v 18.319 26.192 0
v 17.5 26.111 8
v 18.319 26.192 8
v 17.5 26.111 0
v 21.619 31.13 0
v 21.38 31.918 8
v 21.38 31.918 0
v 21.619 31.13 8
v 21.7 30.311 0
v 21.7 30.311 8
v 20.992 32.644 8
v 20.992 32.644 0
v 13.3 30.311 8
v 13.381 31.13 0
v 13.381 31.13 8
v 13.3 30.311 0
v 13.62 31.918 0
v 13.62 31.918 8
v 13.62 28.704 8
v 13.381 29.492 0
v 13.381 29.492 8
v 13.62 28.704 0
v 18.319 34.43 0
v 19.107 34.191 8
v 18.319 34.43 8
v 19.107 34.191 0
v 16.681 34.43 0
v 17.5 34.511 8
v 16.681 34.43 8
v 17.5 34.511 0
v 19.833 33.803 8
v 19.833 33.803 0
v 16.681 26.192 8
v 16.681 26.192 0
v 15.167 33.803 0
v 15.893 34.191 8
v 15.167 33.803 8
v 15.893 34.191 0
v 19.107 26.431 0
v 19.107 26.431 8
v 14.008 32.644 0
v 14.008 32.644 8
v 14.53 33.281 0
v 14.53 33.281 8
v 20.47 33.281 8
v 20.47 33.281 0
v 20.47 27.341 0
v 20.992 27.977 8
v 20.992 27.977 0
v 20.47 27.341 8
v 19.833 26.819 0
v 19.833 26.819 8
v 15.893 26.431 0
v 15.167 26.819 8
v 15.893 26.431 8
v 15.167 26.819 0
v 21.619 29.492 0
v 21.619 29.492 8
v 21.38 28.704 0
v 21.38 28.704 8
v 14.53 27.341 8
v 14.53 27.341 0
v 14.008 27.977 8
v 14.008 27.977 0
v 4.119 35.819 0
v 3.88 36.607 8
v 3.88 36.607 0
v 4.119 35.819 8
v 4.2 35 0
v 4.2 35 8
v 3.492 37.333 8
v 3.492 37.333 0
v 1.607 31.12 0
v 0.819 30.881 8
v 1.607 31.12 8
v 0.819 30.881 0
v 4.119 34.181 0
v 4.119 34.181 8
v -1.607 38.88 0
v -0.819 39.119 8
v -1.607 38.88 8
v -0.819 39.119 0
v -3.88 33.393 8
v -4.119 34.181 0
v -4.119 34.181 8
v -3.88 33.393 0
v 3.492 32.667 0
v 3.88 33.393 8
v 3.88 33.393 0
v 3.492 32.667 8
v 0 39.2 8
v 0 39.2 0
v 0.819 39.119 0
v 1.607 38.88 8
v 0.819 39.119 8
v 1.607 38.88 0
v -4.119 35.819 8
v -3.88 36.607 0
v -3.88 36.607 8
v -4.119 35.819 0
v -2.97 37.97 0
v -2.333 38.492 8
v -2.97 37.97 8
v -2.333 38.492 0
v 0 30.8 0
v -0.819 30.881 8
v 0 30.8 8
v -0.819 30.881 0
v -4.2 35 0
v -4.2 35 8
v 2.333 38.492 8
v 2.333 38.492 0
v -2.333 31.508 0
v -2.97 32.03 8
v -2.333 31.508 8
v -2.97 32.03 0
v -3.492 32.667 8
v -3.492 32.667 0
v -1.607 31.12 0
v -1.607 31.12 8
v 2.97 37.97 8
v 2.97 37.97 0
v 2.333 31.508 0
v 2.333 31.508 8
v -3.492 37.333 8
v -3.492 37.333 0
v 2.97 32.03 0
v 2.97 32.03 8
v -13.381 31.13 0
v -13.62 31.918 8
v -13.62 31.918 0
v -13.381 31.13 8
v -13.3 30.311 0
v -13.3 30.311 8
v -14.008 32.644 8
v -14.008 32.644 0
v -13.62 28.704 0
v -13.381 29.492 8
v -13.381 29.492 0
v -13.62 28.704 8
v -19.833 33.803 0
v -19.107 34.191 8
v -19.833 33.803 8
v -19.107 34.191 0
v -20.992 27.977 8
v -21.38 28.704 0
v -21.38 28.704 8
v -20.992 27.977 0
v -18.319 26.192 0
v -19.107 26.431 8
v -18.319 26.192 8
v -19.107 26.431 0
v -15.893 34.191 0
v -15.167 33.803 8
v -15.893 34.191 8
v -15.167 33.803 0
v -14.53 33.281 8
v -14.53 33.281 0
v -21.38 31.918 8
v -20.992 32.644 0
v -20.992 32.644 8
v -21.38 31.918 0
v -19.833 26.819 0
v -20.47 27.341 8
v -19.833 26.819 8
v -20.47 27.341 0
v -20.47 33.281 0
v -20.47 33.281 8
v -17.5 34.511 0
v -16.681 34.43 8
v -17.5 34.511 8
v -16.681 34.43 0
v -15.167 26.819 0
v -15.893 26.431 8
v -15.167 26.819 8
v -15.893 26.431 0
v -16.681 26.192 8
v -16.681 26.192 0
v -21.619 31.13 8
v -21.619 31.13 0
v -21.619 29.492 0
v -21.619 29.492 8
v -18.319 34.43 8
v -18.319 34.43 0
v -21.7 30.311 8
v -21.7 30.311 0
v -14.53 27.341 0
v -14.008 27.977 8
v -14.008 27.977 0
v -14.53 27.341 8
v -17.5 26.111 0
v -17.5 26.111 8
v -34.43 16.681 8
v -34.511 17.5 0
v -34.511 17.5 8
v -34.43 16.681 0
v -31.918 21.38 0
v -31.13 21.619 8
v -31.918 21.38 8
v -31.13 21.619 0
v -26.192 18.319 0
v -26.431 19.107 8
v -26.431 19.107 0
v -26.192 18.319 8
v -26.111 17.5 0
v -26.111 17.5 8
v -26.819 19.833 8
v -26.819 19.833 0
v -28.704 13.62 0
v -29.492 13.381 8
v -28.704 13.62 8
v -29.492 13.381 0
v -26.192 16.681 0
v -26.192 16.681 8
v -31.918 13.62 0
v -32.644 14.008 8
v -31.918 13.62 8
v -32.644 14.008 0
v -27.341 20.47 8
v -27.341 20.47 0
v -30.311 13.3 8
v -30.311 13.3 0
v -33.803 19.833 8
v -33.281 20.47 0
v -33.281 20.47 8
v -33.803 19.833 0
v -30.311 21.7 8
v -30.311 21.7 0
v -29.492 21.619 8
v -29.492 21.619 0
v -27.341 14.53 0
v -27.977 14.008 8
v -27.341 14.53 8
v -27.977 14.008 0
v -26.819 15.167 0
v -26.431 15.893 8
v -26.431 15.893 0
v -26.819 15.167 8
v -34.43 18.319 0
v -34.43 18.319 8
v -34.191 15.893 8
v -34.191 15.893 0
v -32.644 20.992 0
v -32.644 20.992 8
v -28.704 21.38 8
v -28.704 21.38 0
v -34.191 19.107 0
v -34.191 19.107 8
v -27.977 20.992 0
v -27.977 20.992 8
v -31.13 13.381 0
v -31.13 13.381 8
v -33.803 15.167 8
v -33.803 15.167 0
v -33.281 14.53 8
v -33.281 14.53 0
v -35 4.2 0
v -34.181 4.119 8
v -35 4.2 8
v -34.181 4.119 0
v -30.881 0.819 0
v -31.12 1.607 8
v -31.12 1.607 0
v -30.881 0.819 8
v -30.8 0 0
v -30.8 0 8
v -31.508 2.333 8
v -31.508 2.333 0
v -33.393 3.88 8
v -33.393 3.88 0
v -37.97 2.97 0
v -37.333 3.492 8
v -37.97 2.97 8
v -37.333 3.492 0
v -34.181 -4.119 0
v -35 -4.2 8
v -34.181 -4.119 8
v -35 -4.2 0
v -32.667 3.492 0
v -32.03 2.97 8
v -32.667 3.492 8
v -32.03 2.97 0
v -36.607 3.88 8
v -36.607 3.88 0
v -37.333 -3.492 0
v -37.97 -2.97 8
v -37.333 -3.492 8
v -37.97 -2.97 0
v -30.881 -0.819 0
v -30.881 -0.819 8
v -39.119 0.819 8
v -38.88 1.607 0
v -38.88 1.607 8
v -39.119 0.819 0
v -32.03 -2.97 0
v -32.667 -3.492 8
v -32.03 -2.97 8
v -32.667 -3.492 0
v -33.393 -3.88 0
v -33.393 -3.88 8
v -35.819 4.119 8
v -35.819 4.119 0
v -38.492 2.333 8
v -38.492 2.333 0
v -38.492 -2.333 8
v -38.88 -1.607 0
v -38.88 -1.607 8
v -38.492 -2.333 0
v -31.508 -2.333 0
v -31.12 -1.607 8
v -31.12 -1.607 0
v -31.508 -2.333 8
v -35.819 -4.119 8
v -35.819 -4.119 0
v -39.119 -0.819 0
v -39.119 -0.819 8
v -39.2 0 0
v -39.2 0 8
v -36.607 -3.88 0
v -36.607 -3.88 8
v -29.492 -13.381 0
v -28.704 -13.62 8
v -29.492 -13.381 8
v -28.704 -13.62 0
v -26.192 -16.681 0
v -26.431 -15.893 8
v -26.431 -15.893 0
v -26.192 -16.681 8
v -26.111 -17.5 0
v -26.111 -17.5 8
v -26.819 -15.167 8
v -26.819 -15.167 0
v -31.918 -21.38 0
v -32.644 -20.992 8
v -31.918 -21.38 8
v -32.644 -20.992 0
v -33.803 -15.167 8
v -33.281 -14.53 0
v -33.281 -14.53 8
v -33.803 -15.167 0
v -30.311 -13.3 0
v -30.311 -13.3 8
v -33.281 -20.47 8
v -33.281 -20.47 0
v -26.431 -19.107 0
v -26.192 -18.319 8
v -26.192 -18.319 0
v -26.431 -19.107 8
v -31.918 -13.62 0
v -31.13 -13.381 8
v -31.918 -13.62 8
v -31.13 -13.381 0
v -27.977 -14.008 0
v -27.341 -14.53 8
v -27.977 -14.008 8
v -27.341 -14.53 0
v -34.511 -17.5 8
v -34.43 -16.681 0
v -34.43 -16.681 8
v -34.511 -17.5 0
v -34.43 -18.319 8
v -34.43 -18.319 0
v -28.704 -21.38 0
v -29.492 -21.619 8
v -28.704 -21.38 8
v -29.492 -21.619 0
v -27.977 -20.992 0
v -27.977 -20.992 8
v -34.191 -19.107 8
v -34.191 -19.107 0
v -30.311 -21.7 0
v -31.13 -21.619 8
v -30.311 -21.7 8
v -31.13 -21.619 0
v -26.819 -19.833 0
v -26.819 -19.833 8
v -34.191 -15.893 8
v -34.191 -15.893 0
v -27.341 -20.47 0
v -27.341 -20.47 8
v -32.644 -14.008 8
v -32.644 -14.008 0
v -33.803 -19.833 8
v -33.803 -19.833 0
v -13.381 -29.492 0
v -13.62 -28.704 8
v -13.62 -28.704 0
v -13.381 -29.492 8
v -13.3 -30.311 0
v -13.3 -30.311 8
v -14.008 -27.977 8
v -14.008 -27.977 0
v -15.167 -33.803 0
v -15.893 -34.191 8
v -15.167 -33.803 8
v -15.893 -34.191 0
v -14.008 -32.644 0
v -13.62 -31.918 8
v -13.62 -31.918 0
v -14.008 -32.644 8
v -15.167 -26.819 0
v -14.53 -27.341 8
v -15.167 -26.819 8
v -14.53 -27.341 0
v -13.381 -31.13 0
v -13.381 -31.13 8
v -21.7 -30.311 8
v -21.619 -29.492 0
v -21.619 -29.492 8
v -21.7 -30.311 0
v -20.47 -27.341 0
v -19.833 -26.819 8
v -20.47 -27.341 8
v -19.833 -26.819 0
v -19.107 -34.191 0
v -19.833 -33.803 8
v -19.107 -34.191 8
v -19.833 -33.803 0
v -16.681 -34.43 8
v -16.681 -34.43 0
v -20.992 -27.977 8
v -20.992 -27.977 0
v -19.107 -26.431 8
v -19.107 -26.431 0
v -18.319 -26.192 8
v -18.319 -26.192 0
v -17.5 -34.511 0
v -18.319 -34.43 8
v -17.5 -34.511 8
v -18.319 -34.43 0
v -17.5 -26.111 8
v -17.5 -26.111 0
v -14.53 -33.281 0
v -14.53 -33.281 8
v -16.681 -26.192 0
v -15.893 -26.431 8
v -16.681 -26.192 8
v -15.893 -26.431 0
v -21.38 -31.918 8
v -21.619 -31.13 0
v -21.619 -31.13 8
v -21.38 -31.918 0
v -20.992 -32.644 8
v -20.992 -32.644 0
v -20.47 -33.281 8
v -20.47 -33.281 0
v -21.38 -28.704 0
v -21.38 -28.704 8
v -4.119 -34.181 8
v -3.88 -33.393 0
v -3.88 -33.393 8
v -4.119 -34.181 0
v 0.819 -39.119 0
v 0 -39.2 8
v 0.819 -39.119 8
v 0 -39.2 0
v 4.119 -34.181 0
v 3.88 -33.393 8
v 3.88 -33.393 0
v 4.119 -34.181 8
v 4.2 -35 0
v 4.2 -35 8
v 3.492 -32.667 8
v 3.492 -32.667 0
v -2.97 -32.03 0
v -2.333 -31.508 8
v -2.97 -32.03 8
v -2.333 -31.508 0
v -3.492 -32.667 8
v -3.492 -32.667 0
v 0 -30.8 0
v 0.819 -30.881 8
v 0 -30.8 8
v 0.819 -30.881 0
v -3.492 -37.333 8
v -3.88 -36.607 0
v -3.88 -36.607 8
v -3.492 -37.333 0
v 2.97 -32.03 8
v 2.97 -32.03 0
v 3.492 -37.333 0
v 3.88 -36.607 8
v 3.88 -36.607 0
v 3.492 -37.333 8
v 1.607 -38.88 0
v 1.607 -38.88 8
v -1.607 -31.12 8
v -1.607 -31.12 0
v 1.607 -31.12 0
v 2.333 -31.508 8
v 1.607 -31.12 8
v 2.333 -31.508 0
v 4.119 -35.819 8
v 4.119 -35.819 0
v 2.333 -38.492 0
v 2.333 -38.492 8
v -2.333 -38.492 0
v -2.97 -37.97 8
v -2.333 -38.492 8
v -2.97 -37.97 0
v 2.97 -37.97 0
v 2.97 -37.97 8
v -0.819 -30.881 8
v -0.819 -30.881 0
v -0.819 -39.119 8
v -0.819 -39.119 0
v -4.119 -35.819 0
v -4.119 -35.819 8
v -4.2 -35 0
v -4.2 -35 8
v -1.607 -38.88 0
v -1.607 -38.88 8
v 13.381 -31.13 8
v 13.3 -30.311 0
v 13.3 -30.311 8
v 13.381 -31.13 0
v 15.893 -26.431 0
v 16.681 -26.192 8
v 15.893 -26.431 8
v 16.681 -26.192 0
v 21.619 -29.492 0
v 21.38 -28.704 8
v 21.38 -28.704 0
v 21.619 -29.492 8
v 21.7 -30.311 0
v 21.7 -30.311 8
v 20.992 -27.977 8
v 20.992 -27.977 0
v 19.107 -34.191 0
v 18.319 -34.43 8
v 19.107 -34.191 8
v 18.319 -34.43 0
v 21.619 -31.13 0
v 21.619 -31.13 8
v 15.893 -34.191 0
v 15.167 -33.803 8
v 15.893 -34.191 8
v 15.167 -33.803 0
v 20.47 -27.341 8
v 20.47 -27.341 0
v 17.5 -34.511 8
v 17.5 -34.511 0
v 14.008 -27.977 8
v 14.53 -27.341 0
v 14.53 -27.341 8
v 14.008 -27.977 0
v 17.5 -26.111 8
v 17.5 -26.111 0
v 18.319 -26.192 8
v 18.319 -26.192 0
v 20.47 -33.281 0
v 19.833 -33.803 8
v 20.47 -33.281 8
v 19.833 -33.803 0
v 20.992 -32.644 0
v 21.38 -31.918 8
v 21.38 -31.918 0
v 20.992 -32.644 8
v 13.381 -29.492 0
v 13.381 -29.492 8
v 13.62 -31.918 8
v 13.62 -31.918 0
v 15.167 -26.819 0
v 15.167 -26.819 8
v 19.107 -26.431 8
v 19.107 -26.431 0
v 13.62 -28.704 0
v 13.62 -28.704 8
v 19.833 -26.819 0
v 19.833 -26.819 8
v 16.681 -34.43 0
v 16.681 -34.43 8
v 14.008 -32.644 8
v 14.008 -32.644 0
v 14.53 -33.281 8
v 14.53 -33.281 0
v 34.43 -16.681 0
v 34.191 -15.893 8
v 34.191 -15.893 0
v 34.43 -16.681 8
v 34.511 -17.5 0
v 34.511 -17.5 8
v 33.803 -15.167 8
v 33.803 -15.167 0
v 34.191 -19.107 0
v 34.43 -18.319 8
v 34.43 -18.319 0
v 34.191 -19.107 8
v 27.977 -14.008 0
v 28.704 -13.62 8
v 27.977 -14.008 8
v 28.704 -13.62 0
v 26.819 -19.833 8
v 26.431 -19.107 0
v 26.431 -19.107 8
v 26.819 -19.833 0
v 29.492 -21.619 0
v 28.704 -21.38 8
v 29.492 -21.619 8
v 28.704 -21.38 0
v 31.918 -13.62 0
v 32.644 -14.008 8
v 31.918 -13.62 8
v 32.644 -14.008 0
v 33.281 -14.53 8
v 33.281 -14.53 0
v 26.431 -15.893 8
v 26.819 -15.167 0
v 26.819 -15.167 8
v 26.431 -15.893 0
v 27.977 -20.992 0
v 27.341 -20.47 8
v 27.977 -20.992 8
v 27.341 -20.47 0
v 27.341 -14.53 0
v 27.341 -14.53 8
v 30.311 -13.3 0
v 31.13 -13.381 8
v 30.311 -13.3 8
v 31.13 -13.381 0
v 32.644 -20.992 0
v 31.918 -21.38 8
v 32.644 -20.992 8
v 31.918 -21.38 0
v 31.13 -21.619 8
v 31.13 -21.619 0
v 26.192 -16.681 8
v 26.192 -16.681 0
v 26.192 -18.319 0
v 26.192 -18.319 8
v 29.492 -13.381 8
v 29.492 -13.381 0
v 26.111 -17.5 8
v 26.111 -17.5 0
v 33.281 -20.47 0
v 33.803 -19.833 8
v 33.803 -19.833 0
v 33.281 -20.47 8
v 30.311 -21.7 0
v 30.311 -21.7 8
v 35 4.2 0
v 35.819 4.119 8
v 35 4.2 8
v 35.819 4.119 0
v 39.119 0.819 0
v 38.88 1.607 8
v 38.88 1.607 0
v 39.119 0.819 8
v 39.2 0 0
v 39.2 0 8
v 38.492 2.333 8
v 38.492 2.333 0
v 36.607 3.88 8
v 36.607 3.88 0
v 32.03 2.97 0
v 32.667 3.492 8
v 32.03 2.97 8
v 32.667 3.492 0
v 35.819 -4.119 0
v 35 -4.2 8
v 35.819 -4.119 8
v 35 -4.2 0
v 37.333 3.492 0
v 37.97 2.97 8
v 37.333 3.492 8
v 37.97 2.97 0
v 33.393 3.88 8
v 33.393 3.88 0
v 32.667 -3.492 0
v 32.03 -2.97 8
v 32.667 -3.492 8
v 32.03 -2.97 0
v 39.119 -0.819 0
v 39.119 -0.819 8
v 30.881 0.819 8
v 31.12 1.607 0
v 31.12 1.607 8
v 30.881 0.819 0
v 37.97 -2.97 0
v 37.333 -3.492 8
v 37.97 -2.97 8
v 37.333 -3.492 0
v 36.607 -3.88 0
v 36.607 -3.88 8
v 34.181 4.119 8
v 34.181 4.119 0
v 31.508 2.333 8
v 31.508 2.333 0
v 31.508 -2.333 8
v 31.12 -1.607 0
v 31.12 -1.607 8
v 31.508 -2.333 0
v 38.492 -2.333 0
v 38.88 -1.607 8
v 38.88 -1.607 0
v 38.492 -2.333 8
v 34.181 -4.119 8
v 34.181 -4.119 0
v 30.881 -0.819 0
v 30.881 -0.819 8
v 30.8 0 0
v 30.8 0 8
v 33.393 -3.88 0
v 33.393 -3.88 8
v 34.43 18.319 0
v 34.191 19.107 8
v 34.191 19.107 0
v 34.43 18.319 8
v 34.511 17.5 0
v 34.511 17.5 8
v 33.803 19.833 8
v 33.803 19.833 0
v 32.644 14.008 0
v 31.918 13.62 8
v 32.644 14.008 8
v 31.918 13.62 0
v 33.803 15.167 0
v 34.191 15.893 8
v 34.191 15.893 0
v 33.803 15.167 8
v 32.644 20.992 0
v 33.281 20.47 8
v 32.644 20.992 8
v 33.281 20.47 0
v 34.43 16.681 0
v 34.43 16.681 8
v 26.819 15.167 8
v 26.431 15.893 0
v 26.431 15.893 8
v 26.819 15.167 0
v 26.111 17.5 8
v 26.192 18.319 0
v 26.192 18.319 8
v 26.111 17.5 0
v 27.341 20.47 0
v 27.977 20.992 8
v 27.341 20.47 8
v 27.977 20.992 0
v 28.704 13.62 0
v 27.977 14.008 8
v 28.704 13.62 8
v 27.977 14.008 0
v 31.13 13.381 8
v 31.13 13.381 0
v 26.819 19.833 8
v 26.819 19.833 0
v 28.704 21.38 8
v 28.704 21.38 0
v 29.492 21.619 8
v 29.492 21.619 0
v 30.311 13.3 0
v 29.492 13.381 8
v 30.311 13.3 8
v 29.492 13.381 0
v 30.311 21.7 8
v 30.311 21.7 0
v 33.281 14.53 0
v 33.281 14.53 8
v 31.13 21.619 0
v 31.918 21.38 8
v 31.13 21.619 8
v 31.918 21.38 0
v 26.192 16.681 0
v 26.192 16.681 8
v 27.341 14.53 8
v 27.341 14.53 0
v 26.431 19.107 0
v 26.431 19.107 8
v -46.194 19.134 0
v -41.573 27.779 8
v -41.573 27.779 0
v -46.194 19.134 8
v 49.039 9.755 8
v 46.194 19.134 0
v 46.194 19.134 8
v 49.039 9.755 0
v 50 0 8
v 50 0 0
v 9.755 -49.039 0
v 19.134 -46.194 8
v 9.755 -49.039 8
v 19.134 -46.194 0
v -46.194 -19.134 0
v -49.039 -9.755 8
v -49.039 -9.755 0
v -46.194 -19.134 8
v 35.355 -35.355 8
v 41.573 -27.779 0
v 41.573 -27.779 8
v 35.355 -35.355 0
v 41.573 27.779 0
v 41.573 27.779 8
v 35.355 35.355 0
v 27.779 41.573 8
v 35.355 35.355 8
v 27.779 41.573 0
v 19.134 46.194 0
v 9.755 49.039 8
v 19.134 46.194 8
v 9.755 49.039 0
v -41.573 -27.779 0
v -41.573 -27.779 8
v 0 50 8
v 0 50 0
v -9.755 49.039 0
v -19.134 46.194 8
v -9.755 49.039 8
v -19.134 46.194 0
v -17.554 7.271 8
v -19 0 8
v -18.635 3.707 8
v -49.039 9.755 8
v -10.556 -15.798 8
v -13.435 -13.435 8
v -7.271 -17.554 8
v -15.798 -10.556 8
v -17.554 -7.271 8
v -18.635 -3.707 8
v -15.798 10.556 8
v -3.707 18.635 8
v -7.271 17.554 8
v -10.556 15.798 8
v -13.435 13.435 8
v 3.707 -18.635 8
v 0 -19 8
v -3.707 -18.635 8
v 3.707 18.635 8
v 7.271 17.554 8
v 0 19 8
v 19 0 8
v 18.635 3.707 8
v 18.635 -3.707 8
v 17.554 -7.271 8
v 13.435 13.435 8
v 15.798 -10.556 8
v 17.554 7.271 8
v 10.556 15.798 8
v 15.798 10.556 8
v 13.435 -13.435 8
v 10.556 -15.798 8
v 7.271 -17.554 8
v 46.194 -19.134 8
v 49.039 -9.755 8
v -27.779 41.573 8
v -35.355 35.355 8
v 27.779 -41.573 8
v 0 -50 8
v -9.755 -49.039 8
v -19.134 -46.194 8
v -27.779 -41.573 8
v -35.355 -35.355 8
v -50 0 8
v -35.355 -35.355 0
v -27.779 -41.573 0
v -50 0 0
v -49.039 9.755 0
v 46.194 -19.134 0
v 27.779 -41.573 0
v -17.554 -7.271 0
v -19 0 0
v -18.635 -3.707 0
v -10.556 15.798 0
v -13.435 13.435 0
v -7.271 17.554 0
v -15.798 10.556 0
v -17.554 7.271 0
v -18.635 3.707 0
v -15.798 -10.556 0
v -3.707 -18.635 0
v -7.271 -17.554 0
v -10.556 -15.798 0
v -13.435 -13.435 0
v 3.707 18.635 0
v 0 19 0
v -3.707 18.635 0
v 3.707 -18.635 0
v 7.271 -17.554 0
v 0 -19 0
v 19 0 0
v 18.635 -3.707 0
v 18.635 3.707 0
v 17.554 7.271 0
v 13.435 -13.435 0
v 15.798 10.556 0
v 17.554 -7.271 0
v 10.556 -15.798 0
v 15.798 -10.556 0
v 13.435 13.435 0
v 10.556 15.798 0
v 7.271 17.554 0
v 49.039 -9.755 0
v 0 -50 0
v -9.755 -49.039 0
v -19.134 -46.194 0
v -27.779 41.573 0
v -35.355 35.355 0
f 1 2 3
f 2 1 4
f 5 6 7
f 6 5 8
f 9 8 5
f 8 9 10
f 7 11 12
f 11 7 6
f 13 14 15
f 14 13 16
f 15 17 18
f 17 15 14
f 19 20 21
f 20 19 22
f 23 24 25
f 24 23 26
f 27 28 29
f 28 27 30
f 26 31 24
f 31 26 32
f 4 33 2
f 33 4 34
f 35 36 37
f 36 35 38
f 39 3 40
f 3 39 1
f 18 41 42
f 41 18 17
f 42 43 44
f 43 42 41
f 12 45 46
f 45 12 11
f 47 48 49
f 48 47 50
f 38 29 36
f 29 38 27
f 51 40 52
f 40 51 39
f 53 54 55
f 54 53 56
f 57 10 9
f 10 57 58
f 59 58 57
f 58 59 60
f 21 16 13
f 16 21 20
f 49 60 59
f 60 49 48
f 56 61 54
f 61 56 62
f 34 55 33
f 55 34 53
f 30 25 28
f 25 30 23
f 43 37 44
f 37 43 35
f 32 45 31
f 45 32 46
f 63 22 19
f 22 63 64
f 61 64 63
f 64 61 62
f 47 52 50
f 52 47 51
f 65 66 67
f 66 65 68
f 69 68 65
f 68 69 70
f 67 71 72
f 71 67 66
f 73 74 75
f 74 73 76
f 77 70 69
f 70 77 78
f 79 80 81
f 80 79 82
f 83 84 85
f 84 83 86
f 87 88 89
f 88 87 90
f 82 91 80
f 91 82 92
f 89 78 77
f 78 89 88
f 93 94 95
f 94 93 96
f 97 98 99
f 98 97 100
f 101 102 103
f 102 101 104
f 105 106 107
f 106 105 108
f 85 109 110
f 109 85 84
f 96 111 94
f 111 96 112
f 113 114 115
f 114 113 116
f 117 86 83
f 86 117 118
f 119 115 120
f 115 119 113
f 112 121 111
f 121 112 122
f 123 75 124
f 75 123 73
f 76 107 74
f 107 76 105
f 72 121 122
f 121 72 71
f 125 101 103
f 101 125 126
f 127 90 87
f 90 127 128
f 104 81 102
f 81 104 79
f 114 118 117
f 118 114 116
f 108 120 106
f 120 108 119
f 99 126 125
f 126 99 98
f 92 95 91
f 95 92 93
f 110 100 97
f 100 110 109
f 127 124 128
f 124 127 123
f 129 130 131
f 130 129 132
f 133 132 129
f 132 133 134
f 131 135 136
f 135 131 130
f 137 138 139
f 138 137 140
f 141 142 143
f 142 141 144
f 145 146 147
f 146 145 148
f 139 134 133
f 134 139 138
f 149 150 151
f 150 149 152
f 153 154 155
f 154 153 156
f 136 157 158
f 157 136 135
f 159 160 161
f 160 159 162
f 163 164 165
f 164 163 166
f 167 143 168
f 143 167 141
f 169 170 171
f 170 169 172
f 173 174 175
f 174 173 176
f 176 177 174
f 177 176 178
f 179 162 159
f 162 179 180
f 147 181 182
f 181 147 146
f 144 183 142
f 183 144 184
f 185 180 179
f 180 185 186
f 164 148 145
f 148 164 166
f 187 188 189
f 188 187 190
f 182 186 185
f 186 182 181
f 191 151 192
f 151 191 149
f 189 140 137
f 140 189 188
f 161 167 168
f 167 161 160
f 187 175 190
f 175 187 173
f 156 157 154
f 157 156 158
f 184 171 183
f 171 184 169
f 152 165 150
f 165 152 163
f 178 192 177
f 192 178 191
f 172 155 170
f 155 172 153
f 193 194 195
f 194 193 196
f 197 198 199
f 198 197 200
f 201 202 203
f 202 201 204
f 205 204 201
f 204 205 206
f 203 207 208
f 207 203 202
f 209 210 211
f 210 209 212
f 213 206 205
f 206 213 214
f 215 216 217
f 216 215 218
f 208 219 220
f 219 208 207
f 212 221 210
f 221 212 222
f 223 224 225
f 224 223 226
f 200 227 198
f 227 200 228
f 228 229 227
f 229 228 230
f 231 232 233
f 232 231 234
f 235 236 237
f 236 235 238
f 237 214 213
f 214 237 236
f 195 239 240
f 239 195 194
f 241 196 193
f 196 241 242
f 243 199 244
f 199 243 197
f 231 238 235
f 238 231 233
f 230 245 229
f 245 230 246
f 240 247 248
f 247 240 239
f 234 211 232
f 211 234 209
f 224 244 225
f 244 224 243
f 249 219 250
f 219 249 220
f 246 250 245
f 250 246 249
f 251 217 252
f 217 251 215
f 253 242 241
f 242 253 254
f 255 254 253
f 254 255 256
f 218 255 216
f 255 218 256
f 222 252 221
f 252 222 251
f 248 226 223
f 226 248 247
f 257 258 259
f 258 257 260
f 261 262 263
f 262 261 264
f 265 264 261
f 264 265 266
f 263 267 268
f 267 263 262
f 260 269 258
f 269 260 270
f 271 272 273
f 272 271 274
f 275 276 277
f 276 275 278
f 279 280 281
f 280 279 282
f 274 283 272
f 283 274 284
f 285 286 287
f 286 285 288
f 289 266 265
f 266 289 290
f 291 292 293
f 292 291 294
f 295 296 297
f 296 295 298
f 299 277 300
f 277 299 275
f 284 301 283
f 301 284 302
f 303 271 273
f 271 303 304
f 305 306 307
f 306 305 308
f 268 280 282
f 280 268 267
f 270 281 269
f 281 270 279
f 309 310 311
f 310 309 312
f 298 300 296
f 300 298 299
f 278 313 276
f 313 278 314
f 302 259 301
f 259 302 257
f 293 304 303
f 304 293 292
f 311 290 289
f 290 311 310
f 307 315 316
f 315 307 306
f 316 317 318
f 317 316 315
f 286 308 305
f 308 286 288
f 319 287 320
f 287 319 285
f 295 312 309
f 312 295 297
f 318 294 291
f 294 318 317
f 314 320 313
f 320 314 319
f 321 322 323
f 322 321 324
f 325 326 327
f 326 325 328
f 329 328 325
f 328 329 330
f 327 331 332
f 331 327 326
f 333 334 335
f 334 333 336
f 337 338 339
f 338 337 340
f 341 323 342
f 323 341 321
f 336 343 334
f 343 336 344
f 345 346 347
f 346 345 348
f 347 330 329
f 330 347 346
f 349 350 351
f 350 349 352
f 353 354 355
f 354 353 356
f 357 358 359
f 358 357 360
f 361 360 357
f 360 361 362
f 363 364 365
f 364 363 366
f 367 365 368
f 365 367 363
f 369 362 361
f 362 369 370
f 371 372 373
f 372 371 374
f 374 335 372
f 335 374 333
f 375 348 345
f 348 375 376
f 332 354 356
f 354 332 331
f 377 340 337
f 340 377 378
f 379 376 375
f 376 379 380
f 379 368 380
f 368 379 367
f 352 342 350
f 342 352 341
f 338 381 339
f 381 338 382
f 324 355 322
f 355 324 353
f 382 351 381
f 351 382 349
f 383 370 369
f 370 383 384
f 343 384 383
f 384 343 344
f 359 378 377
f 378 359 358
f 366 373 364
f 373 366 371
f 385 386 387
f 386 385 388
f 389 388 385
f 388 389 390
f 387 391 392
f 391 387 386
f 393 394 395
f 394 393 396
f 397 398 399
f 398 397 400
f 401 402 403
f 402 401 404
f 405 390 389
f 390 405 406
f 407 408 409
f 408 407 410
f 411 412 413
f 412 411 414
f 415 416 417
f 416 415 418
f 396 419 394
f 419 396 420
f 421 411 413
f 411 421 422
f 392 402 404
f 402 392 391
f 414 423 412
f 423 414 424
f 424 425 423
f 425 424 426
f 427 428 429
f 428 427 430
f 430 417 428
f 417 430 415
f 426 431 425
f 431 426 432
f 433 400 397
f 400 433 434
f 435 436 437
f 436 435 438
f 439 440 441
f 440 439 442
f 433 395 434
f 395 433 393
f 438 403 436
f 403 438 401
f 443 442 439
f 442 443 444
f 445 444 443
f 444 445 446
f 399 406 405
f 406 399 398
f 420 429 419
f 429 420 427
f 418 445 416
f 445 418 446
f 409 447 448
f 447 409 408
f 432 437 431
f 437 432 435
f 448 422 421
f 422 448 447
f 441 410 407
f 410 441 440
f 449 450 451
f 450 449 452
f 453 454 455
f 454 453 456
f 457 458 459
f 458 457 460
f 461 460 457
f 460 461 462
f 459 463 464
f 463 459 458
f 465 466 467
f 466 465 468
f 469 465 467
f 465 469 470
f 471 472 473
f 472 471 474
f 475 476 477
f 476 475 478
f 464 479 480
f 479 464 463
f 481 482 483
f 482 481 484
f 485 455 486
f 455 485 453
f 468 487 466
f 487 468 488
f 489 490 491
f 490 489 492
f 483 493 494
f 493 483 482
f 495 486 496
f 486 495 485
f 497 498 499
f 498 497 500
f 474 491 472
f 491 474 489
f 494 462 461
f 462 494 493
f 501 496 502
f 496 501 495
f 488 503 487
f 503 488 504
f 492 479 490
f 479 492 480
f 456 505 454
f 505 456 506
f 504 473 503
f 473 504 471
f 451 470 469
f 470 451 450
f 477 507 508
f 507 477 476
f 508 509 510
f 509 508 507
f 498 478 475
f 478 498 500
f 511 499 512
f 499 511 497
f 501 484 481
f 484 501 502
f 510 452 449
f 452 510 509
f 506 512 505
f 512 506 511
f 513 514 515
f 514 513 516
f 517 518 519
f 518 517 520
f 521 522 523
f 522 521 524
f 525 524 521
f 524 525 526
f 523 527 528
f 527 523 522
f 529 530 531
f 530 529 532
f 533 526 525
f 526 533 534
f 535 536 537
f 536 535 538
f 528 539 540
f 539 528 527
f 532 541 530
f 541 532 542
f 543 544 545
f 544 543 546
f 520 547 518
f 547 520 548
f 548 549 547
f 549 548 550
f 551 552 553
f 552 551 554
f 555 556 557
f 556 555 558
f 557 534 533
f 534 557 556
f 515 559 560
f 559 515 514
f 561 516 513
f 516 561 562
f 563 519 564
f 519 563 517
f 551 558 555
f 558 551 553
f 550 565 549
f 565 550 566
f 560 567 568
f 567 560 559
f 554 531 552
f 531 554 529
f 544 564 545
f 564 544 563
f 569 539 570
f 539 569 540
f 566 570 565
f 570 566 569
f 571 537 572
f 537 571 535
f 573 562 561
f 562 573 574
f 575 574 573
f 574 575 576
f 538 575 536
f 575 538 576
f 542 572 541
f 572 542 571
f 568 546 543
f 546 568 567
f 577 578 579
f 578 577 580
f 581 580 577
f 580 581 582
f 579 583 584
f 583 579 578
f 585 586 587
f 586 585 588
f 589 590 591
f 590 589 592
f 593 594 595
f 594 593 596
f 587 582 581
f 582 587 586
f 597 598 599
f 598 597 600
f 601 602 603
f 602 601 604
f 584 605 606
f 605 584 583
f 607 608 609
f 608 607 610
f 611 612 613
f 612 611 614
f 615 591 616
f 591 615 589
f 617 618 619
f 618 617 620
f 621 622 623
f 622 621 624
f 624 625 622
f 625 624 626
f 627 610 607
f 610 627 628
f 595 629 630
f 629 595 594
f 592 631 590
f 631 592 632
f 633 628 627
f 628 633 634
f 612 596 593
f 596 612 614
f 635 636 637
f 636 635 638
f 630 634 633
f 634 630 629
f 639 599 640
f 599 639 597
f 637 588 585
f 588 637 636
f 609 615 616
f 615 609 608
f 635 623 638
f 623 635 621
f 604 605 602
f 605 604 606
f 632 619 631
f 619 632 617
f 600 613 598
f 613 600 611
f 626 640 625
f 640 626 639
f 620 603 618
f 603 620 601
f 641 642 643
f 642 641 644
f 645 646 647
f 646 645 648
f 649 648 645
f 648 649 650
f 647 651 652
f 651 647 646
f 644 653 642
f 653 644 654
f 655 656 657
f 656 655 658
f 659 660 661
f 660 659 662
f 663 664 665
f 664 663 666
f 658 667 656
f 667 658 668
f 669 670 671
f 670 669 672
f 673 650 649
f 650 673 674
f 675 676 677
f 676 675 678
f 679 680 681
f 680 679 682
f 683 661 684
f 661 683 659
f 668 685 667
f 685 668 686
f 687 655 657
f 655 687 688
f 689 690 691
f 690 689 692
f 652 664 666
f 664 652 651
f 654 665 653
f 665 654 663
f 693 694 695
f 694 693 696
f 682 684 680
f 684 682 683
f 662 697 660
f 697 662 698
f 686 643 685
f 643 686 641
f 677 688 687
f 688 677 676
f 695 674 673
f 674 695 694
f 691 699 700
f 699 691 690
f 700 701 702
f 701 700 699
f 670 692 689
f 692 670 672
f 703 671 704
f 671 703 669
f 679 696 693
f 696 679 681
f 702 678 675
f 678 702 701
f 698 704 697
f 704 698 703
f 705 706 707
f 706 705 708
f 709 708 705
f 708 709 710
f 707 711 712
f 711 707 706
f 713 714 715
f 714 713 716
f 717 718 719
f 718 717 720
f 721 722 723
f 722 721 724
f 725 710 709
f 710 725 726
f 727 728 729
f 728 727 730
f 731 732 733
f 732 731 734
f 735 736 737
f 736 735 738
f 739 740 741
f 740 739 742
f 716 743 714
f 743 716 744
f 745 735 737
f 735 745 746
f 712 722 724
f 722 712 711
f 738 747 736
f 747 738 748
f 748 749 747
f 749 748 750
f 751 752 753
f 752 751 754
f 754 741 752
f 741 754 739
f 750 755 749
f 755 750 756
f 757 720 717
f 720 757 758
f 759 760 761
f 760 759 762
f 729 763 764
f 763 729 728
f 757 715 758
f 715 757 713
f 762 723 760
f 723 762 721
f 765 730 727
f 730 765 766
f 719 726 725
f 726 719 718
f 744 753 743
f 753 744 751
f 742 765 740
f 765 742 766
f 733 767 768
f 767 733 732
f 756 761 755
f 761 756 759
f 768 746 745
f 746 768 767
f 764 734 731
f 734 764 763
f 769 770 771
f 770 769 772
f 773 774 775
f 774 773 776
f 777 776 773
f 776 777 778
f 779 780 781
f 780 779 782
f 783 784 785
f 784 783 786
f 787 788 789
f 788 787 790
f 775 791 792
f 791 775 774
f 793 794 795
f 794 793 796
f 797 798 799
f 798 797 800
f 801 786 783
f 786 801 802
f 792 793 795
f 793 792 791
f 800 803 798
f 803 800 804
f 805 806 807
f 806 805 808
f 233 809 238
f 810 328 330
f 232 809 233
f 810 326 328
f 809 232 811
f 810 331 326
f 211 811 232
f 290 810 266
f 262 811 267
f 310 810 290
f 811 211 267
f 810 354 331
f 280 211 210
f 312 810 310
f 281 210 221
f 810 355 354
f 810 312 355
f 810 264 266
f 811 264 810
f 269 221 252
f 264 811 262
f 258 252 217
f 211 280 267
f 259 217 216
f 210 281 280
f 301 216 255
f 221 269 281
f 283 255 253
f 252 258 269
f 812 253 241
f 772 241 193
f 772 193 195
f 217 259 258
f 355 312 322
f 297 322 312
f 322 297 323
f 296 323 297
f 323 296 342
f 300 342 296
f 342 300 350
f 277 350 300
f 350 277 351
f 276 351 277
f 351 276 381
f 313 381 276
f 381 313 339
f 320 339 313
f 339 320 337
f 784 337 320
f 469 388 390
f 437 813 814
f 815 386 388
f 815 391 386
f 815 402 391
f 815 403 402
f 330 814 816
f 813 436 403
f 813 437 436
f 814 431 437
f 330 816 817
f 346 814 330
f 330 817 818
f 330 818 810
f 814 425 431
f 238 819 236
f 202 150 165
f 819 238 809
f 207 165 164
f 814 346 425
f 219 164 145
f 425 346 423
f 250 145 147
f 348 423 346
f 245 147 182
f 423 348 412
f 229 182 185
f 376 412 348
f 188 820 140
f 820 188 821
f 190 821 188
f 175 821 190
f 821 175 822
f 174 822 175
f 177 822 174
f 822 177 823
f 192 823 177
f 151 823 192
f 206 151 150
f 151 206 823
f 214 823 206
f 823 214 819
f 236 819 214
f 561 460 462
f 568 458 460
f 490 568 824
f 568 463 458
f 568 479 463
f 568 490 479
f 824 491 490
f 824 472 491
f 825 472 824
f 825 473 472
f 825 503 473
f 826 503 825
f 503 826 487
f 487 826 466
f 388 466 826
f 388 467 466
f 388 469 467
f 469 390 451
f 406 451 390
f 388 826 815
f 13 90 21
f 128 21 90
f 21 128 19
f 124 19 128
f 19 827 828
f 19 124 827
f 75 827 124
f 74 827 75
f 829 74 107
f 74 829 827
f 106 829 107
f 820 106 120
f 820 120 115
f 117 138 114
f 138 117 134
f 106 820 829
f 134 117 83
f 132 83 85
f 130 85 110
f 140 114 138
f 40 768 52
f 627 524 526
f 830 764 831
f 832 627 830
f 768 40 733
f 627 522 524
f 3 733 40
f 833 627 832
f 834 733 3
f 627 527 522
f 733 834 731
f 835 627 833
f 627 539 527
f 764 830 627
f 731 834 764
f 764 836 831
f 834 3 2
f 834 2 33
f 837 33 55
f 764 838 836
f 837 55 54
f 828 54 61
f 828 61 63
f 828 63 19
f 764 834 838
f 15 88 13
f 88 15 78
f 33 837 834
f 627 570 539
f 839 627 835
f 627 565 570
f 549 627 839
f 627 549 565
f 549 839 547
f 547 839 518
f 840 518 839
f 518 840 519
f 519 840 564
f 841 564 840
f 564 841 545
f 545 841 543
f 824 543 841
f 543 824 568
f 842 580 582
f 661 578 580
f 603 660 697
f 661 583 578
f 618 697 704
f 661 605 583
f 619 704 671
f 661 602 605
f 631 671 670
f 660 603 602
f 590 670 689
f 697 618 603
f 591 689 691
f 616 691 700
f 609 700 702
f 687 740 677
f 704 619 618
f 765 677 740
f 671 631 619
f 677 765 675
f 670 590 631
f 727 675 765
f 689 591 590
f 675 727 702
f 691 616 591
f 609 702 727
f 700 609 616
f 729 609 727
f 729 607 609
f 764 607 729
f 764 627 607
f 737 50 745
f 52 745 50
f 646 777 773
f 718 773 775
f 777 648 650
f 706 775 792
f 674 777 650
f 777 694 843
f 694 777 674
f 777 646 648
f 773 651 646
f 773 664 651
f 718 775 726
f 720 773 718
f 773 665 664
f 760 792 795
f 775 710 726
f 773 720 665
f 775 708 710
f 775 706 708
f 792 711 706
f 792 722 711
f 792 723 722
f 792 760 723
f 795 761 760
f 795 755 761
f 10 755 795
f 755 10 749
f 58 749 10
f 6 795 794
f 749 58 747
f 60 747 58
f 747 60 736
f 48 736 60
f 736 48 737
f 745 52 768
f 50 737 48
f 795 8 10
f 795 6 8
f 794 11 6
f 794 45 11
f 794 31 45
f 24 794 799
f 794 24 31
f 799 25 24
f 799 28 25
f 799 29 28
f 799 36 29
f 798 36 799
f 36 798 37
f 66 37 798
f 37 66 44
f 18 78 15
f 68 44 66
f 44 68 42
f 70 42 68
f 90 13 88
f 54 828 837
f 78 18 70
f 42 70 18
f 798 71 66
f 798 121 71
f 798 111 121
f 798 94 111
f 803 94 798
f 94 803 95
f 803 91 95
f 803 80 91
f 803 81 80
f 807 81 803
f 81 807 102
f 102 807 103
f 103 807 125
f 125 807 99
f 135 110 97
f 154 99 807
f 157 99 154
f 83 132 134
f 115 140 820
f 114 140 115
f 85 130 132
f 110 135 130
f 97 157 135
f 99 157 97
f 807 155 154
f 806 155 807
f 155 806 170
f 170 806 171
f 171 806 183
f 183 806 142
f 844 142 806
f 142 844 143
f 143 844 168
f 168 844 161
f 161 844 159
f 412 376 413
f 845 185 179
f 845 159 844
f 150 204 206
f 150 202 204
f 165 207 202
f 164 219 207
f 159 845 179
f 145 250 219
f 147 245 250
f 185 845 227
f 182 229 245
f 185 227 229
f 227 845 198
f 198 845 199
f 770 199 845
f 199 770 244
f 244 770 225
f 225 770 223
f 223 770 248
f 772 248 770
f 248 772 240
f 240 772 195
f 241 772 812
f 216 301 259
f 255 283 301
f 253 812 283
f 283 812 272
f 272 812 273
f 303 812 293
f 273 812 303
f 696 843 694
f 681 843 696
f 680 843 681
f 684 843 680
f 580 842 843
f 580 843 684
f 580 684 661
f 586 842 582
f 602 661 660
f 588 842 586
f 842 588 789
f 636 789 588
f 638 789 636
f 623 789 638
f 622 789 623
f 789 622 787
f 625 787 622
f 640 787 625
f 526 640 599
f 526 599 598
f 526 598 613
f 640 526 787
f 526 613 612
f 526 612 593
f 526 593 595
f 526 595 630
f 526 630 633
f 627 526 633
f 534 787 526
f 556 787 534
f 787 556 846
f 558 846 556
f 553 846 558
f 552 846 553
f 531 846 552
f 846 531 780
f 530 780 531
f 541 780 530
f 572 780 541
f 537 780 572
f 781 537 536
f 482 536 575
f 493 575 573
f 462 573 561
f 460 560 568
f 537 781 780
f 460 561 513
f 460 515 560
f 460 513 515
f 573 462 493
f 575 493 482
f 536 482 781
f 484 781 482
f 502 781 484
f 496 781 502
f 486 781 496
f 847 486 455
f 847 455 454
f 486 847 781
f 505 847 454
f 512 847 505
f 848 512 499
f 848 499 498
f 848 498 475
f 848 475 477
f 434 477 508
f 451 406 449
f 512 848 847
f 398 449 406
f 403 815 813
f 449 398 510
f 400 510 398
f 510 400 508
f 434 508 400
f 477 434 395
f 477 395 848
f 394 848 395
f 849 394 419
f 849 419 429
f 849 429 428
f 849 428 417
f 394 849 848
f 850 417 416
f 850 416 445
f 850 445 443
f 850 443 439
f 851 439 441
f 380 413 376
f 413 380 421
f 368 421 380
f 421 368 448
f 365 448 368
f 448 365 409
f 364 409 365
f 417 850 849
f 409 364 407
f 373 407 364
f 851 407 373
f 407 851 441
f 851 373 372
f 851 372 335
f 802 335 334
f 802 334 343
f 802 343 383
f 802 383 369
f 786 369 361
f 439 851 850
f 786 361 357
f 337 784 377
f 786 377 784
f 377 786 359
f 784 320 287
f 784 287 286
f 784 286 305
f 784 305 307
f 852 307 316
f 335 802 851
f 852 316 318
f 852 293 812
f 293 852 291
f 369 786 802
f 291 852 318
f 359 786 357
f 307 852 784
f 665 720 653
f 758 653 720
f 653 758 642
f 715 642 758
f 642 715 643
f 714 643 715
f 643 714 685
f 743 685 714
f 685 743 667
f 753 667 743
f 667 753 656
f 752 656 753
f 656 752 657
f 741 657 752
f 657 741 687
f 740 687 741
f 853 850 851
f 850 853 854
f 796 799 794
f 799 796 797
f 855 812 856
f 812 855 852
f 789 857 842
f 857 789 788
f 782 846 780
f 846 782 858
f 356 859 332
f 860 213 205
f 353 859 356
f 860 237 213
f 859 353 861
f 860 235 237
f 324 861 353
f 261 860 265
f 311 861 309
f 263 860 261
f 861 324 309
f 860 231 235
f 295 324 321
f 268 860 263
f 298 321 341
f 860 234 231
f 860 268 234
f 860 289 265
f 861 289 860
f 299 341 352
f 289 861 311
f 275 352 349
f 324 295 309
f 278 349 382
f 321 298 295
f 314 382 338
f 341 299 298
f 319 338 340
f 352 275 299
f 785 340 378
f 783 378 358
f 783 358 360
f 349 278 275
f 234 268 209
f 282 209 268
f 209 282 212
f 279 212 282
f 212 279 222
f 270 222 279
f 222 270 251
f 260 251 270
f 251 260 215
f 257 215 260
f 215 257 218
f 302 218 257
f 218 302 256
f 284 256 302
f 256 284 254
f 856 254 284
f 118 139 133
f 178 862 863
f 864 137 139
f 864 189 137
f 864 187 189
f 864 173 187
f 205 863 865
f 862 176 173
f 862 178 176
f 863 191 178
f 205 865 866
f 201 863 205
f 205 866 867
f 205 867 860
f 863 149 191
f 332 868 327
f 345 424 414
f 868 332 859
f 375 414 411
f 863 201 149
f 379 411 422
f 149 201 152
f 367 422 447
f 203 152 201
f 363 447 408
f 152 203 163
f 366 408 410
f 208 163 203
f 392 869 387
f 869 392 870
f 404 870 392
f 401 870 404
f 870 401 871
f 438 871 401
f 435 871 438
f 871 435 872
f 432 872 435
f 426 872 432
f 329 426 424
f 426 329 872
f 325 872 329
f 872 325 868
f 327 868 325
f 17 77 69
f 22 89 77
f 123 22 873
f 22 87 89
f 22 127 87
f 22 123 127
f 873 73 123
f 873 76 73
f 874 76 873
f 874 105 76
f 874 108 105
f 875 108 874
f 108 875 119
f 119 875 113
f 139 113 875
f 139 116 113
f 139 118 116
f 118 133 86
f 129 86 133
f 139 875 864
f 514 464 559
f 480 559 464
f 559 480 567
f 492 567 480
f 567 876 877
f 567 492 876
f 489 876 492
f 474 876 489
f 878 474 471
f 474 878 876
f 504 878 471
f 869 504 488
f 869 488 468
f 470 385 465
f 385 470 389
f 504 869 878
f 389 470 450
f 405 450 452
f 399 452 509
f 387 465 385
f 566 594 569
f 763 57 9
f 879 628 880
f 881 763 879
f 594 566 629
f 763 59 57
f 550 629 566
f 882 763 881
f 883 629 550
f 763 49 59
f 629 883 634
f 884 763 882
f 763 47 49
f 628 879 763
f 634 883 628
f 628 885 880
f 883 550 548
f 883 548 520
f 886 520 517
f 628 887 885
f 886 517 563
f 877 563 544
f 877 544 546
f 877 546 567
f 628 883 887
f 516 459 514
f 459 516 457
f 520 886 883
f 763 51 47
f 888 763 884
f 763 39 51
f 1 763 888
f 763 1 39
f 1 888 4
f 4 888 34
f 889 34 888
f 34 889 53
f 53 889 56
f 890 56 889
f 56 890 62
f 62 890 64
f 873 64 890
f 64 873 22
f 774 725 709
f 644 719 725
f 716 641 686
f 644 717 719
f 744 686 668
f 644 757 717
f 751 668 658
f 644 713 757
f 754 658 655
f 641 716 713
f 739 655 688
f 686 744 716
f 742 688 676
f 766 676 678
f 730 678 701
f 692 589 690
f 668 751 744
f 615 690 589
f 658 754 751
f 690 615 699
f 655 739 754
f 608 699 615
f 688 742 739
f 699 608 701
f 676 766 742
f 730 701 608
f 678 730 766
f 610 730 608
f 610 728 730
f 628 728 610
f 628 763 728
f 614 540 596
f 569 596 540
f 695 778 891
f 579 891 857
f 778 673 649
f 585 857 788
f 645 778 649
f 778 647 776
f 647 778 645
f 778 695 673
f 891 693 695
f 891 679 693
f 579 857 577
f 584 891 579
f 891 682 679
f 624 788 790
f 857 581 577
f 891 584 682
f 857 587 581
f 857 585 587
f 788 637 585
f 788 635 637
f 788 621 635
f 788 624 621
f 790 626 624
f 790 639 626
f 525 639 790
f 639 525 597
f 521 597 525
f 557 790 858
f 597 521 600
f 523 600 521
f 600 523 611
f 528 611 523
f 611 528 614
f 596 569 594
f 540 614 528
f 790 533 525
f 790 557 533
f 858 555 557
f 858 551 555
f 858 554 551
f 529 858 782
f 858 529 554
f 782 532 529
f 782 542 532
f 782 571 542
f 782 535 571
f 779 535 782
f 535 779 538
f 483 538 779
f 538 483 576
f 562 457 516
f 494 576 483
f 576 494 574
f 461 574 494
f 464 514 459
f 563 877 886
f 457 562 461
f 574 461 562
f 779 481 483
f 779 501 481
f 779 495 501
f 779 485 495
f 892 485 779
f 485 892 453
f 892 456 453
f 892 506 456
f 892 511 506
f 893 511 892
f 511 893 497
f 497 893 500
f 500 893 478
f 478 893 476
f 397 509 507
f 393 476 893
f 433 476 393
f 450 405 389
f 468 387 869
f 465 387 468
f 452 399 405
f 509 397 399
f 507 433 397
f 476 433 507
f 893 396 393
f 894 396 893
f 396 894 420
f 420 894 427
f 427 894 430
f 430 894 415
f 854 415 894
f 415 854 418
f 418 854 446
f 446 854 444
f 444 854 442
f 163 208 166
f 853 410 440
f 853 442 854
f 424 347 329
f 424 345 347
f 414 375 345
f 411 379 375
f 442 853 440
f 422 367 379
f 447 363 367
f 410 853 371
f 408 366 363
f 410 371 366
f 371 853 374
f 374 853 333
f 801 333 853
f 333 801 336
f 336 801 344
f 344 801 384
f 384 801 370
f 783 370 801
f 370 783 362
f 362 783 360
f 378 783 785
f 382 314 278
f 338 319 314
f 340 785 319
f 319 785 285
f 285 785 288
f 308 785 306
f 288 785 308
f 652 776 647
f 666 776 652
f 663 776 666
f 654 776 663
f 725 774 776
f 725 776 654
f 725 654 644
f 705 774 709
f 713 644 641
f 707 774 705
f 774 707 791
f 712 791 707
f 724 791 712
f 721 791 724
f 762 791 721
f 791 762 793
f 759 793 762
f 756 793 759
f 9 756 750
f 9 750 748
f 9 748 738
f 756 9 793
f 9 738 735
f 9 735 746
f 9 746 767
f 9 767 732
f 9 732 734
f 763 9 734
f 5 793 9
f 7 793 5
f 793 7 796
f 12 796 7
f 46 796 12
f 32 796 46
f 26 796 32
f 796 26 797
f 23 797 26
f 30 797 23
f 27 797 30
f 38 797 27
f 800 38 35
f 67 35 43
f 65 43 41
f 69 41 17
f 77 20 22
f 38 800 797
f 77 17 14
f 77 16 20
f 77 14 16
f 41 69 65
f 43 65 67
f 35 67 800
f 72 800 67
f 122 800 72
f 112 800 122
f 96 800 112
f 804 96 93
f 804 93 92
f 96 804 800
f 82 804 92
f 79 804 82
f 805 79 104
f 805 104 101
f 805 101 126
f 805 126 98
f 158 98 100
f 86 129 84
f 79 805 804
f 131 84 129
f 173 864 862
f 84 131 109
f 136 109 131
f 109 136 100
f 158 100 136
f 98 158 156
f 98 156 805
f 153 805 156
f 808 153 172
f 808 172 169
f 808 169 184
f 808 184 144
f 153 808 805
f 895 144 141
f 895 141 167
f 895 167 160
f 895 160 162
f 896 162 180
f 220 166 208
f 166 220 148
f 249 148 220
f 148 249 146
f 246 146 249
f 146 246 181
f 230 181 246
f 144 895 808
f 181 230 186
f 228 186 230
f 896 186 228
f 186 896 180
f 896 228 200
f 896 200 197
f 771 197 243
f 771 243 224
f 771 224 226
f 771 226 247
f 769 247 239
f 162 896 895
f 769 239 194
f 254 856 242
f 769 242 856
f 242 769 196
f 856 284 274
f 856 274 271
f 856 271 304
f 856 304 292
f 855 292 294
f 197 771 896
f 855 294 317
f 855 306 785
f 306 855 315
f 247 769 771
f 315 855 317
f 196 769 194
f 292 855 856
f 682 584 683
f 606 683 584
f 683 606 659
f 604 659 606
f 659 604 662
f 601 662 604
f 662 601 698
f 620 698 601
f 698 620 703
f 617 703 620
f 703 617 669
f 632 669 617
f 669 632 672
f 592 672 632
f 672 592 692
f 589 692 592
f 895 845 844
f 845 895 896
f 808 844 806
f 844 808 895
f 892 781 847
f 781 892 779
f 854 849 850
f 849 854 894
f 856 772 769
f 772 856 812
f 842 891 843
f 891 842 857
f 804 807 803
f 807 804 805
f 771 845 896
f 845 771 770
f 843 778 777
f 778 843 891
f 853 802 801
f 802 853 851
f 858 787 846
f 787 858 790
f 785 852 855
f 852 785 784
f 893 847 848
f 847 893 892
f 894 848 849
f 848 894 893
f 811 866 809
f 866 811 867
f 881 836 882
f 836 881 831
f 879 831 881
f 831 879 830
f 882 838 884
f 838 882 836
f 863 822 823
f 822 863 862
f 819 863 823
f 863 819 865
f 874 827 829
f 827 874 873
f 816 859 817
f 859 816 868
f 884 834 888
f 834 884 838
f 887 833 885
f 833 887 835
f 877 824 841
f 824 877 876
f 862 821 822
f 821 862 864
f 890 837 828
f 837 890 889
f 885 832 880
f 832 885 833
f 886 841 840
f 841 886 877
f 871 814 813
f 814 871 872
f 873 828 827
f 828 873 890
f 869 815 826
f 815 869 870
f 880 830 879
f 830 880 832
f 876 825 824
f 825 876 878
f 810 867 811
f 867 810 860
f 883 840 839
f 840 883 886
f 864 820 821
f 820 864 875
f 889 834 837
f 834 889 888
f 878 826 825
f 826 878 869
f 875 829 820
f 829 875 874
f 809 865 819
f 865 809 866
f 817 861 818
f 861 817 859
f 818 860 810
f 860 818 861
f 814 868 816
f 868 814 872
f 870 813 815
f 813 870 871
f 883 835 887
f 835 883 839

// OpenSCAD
$fn = 32;

// ----------------------------------------------------------------------
// Flange Ø100 x 8
// 12 holes on a Ø70 bolt circle, bolted joints
// ----------------------------------------------------------------------

// --- parameters (mm) ---
flange_d = 100;  // outside diameter of the flange
thickness = 8;   // flange thickness
holes = 12;      // number of bolt holes
pcd = 70;        // bolt circle diameter
start_deg = 60;  // angle of the first hole, from +X
hole_d = 8.4;    // bolt hole diameter
bore_d = 38;     // central through bore
hub_d = 46;      // hub outside diameter
hub_h = 0;       // hub height above the flange face (0 = no hub)

// --- derived feature positions (mm) ---
height = thickness + hub_h;  // = 8   overall height of the part
pcd_r = pcd / 2;             // = 35   bolt circle radius
hole_step = 360 / holes;     // = 30   angular pitch
feature_centers = [
  [pcd_r * cos(start_deg + 0 * hole_step), pcd_r * sin(start_deg + 0 * hole_step)],
  [pcd_r * cos(start_deg + 1 * hole_step), pcd_r * sin(start_deg + 1 * hole_step)],
  [pcd_r * cos(start_deg + 2 * hole_step), pcd_r * sin(start_deg + 2 * hole_step)],
  [pcd_r * cos(start_deg + 3 * hole_step), pcd_r * sin(start_deg + 3 * hole_step)],
  [pcd_r * cos(start_deg + 4 * hole_step), pcd_r * sin(start_deg + 4 * hole_step)],
  [pcd_r * cos(start_deg + 5 * hole_step), pcd_r * sin(start_deg + 5 * hole_step)],
  [pcd_r * cos(start_deg + 6 * hole_step), pcd_r * sin(start_deg + 6 * hole_step)],
  [pcd_r * cos(start_deg + 7 * hole_step), pcd_r * sin(start_deg + 7 * hole_step)],
  [pcd_r * cos(start_deg + 8 * hole_step), pcd_r * sin(start_deg + 8 * hole_step)],
  [pcd_r * cos(start_deg + 9 * hole_step), pcd_r * sin(start_deg + 9 * hole_step)],
  [pcd_r * cos(start_deg + 10 * hole_step), pcd_r * sin(start_deg + 10 * hole_step)],
  [pcd_r * cos(start_deg + 11 * hole_step), pcd_r * sin(start_deg + 11 * hole_step)]
];   // bolt hole centres on the pitch circle

// flange disc, every hole and the bore cut straight through
difference() {
  union() {
    cylinder(d = flange_d, h = thickness);
  }
  translate([0, 0, -1]) cylinder(d = bore_d, h = height + 2);  // bore, through
  for (centre = feature_centers)
    translate([centre[0], centre[1], -1]) cylinder(d = hole_d, h = thickness + 2);
}
